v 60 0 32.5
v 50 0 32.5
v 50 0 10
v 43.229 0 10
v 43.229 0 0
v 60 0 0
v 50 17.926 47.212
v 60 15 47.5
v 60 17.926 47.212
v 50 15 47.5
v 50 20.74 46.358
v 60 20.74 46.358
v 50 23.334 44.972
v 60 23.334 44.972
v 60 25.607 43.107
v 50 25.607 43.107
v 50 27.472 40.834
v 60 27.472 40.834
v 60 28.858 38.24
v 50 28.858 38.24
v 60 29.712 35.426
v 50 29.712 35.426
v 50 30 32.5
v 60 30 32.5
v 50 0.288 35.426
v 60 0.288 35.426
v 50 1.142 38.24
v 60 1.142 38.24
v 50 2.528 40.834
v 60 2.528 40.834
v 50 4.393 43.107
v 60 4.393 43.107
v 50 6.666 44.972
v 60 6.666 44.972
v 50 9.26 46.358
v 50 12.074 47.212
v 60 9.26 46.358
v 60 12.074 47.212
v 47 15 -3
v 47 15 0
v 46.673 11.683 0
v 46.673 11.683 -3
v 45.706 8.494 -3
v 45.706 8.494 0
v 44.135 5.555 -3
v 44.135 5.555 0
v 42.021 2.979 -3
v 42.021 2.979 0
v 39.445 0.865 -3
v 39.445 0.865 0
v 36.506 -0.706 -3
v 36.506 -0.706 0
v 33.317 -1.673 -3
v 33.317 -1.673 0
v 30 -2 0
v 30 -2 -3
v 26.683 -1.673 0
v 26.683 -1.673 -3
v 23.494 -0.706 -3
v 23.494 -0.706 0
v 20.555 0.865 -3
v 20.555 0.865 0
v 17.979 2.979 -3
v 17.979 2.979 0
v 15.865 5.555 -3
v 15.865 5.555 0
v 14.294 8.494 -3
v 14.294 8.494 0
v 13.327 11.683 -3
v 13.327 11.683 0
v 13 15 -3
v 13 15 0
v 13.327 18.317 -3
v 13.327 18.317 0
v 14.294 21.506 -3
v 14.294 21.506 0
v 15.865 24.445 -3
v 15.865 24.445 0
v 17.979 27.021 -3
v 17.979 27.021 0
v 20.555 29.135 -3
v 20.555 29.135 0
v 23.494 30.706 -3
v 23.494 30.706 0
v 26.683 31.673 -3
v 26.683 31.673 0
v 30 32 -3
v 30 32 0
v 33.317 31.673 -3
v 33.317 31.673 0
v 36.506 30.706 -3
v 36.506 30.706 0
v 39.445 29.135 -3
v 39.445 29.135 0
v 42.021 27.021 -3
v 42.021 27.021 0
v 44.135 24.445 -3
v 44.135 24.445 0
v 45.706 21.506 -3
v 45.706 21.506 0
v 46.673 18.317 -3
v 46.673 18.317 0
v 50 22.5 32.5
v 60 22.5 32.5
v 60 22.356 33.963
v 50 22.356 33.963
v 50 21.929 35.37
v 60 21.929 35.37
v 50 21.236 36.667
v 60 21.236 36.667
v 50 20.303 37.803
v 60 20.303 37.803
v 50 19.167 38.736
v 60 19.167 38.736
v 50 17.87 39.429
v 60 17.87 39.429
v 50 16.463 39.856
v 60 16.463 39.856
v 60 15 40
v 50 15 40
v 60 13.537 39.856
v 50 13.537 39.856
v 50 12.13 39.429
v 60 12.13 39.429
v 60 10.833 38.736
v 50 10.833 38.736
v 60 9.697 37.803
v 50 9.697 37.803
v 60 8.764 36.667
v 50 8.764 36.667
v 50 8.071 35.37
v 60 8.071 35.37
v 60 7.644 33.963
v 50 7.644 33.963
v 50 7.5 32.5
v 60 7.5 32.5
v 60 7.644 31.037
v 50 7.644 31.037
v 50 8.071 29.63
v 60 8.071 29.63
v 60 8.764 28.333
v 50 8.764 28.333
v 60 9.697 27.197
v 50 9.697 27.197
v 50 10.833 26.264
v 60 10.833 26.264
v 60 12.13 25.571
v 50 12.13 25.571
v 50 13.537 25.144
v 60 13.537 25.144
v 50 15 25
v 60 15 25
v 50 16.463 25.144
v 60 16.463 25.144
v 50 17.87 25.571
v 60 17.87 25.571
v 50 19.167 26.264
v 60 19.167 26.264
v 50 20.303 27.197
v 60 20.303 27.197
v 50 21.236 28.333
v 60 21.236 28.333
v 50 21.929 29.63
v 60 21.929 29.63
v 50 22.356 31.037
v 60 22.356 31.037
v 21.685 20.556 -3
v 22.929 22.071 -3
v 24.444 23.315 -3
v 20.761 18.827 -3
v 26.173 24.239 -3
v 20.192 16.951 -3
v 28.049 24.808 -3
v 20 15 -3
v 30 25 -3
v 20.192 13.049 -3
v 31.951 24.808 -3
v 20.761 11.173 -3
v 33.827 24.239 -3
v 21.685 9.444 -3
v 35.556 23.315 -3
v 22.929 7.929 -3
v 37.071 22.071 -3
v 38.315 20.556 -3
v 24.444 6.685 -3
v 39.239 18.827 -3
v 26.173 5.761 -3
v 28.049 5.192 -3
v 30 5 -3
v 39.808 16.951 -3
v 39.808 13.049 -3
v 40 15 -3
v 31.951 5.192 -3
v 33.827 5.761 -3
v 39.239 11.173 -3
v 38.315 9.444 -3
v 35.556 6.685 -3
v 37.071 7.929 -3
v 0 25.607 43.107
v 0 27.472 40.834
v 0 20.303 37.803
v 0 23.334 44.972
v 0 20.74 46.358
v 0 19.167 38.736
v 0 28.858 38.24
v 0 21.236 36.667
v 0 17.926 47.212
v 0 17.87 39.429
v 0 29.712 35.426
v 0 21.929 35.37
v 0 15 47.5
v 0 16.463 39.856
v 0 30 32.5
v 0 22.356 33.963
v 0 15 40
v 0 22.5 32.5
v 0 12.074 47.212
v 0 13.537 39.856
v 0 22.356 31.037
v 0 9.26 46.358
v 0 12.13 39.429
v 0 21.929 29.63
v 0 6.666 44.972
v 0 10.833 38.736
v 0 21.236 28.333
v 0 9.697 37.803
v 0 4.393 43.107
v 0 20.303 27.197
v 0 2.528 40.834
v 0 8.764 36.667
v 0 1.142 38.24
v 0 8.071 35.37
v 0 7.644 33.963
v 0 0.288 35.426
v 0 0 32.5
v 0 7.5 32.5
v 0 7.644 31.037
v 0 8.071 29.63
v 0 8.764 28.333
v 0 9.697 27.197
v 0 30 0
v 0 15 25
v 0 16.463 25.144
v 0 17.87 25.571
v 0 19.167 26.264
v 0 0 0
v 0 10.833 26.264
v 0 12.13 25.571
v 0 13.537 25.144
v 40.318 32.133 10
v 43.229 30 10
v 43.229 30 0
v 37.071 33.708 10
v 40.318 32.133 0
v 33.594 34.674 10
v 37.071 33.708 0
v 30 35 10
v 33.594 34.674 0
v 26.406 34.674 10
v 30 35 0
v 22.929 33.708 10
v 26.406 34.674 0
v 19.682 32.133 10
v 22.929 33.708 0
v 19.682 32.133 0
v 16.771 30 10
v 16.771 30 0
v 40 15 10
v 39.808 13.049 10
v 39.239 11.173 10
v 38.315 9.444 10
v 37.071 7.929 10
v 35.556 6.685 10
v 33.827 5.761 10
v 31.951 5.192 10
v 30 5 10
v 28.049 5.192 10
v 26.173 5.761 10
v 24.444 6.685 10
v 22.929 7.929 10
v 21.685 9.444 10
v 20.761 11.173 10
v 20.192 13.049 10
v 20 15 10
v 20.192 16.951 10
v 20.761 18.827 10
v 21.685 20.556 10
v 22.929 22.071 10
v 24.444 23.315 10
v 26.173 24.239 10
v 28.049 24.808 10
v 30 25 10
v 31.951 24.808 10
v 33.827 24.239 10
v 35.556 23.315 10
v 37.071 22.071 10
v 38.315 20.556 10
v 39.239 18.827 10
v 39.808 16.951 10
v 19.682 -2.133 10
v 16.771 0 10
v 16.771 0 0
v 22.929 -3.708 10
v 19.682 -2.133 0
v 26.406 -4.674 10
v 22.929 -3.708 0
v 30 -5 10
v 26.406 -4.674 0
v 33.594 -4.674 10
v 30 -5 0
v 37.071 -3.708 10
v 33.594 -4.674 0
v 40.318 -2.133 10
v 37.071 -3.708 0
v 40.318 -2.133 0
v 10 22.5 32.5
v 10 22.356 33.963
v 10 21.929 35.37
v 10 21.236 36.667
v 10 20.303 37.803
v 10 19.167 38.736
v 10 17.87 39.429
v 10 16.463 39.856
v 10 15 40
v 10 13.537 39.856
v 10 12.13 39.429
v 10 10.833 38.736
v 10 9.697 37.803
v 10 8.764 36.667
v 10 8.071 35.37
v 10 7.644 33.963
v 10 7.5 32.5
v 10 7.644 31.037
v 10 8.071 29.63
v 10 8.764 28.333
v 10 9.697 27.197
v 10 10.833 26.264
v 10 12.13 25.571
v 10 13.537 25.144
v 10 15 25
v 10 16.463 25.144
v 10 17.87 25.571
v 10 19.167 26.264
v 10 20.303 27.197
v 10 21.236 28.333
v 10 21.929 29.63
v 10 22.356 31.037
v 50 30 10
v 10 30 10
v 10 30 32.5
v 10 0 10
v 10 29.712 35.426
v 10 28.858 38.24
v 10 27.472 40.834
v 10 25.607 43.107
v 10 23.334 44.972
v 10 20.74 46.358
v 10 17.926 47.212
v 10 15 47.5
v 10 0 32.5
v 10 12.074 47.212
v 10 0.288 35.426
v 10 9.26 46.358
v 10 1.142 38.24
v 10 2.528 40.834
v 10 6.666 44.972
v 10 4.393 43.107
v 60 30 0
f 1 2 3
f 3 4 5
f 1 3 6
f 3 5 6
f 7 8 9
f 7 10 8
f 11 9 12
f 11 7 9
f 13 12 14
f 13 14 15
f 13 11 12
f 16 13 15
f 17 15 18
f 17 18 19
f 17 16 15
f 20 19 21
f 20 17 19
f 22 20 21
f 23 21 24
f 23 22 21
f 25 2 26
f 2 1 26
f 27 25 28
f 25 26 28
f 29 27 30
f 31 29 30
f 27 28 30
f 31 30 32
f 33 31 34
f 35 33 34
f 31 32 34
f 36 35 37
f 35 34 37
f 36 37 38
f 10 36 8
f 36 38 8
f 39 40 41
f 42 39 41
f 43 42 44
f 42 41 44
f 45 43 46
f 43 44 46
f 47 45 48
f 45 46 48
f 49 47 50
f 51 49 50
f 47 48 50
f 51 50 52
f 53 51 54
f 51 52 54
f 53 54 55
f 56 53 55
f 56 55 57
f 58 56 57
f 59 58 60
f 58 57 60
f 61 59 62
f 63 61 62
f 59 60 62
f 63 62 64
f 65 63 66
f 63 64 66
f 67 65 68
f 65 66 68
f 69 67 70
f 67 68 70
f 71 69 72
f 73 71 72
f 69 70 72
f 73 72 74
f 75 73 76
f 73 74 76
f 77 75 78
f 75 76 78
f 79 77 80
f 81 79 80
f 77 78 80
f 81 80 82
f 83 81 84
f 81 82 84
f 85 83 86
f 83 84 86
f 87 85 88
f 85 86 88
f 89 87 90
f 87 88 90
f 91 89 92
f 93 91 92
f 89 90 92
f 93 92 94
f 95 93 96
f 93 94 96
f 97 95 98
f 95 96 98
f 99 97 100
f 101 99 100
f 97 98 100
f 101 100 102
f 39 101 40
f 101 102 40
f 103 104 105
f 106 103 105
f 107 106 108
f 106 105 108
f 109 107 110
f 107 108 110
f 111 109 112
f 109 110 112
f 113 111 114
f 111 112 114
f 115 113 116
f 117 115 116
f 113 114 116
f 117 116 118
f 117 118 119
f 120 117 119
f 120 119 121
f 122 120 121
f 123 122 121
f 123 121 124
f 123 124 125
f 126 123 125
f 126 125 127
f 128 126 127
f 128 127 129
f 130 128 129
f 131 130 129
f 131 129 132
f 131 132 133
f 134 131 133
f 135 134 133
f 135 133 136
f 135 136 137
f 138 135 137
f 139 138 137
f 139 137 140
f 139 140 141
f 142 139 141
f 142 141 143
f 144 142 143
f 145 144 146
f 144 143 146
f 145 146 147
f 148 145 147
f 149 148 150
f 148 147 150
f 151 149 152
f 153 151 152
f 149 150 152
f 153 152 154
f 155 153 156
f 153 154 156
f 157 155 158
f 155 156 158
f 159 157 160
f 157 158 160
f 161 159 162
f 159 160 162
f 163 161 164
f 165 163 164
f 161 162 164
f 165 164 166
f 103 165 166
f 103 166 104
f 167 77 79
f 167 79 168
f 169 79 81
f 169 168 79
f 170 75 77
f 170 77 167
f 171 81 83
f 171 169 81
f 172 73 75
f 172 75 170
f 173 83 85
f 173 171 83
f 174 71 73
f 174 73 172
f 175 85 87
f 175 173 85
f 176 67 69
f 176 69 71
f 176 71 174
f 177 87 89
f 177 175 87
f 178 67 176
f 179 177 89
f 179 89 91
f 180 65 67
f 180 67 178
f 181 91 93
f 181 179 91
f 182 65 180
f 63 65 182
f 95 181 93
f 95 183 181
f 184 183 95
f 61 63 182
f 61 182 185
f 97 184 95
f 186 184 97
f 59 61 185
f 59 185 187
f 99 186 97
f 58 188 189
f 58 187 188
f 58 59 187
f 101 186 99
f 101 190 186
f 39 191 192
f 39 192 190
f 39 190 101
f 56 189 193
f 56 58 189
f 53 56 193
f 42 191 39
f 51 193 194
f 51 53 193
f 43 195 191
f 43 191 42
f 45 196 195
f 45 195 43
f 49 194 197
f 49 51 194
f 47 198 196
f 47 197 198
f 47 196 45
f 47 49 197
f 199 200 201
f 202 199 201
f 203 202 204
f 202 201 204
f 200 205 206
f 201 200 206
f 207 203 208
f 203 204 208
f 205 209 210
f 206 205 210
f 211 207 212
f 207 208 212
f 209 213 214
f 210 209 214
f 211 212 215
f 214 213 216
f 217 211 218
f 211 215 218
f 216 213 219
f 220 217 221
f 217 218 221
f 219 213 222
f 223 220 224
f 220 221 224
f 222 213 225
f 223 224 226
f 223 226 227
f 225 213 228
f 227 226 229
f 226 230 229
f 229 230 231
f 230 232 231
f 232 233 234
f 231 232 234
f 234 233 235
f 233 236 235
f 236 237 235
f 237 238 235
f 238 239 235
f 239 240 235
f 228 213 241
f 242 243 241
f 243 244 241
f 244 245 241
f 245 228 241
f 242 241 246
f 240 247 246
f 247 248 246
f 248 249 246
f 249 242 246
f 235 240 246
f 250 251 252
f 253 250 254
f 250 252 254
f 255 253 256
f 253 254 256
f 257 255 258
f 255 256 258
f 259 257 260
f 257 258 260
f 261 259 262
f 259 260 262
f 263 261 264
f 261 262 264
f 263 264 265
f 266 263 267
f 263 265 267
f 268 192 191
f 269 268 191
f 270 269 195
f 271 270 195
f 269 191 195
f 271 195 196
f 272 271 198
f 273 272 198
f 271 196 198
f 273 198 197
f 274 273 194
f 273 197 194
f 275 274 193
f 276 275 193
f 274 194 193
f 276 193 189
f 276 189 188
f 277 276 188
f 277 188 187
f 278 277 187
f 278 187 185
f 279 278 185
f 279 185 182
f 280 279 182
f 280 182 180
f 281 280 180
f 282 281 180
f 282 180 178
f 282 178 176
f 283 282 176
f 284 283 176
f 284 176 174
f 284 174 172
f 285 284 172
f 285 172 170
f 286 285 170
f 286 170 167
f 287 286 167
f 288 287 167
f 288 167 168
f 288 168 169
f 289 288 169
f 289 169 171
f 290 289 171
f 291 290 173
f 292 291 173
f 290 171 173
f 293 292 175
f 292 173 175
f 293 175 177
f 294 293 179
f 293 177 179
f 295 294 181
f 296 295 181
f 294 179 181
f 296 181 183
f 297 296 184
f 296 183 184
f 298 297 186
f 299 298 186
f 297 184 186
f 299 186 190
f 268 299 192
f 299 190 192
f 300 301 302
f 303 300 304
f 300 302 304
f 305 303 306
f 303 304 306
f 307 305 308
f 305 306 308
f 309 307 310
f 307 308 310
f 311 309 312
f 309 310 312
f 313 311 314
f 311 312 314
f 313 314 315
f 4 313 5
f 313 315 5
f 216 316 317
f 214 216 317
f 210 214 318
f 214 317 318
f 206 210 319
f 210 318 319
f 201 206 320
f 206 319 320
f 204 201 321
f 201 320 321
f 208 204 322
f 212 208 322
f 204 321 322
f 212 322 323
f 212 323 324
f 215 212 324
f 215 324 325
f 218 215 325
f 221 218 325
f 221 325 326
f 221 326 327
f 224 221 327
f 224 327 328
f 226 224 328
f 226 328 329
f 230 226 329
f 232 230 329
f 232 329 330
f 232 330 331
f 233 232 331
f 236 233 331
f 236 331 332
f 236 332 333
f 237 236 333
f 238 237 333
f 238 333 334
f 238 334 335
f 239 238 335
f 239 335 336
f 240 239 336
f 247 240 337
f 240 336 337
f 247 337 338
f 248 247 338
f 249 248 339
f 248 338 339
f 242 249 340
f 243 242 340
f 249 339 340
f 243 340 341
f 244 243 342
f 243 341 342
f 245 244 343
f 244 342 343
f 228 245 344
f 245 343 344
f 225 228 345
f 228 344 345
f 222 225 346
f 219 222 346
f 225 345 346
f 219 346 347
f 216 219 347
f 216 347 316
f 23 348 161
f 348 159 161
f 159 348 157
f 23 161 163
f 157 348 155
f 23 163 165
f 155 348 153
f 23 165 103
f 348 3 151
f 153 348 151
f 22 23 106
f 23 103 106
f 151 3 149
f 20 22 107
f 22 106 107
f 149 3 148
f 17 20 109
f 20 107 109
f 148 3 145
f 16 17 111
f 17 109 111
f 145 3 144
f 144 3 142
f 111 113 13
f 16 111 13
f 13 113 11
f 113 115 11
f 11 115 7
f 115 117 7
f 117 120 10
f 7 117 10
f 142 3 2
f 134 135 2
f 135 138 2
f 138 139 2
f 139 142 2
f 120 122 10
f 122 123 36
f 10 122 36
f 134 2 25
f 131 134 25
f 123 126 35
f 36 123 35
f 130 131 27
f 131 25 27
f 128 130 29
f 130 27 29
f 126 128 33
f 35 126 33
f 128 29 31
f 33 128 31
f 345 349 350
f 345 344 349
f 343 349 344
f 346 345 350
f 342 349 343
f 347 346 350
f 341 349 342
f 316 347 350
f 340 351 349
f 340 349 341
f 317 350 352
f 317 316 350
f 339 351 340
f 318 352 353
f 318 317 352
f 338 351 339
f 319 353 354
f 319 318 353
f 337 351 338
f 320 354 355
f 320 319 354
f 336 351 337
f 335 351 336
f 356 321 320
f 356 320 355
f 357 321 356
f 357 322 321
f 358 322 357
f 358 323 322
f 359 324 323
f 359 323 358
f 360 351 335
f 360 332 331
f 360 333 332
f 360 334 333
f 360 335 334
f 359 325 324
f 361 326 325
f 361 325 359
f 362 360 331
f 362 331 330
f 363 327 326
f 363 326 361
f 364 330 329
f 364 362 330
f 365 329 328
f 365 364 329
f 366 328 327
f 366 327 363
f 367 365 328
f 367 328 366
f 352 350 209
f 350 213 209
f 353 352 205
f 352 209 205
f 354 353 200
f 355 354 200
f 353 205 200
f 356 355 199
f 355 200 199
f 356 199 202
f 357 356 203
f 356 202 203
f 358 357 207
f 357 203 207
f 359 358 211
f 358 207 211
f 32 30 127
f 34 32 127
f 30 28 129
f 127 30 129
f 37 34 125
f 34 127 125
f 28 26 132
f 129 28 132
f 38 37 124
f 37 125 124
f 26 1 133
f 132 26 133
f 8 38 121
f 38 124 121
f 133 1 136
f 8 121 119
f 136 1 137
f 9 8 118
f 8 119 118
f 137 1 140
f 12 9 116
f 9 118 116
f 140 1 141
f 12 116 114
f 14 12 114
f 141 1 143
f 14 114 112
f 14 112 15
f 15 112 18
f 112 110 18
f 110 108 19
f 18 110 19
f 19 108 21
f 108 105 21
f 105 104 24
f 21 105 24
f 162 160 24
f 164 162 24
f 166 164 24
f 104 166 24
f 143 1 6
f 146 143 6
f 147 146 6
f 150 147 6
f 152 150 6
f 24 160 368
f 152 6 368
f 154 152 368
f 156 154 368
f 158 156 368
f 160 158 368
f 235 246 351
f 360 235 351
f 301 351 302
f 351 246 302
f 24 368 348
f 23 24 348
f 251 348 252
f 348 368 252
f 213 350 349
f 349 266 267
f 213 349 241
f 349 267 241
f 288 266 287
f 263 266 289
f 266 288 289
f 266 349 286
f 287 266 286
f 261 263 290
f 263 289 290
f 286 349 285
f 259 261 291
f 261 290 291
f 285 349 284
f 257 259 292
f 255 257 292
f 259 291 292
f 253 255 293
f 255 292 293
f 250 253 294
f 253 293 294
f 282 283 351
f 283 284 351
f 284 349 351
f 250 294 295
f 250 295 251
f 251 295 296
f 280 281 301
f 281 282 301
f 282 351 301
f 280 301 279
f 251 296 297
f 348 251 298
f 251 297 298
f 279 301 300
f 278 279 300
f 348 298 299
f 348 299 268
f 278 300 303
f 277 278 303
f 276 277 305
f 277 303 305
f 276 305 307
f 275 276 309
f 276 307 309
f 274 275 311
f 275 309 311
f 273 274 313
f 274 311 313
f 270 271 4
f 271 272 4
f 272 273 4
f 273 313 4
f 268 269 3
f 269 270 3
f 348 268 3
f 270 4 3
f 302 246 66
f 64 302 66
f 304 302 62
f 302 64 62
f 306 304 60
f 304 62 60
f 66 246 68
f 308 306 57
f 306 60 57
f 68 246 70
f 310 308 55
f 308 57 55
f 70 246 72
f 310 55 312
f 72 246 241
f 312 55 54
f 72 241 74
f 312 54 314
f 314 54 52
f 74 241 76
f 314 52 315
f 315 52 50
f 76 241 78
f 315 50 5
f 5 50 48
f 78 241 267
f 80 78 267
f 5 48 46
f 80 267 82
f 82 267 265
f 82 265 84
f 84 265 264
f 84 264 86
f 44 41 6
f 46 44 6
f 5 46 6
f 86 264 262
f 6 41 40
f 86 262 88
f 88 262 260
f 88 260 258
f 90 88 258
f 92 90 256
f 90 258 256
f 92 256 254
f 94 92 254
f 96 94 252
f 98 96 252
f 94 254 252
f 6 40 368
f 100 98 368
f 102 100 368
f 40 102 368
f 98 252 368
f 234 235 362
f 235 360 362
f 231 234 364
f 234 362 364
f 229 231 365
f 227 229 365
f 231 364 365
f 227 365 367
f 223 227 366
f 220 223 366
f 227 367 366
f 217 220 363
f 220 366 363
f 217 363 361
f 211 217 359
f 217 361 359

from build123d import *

# Parameters (mm, degrees)
F1_DEPTH  = 47.5
F2_W      = 40
F2_H      = 37.5
F3_DEPTH  = 205
F4_W      = 26.4575131106
F4_H      = 37.5
F5_DEPTH  = 25
F6_R      = 17
F7_DEPTH  = 3
F8_R      = 10
F9_DEPTH  = 25
F11_DEPTH = 125
F12_R     = 14.99999


# Not quite as in the source:
# - a fillet or chamfer is up to 0.001 mm smaller than in the source, because OpenCascade refuses the exact size


with BuildPart() as f1:
    # F0 (on Top) → F1 (new body)
    with BuildSketch(Plane.XY):
        Polygon((0, 15), (0, 0), (16.7712434447, 0), (43.2287565553, 0), (60, 0), (60, 15), (60, 30), (43.2287565553, 30), (16.7712434447, 30), (0, 30), align=None)
        with BuildLine():
            Line((49.2664991614, 20.3667504193), (60, 15))
            Line((60, 15), (50, 15))
            ThreePointArc((50, 15), (49.8157763314, 17.7083220609), (49.2664991614, 20.3667504193))
        make_face(mode=Mode.SUBTRACT)
        with BuildLine():
            Line((43.2287565553, 0), (16.7712434447, 0))
            ThreePointArc((16.7712434447, 0), (30, -5), (43.2287565553, 0))
        make_face()
        with BuildLine():
            ThreePointArc((43.2287565553, 30), (30, 35), (16.7712434447, 30))
            Line((16.7712434447, 30), (43.2287565553, 30))
        make_face()
        with BuildLine():
            Line((50, 15), (60, 15))
            Line((60, 15), (49.2664991614, 20.3667504193))
            ThreePointArc((49.2664991614, 20.3667504193), (49.8157763314, 17.7083220609), (50, 15))
        make_face()
    extrude(amount=F1_DEPTH)

    # F2 (on face) → F3 (cut)
    with BuildSketch(Plane.XZ):
        with Locations((30, 28.75)):
            Rectangle(F2_W, F2_H)
    extrude(amount=-F3_DEPTH, mode=Mode.SUBTRACT)

    # F4 (on face) → F5 (cut)
    with BuildSketch(Plane(origin=(0, 0, 0), x_dir=(-1, 0, 0), z_dir=(0, 1, 0))):
        with Locations((-30, 28.75)):
            Rectangle(F4_W, F4_H)
    extrude(amount=-F5_DEPTH, mode=Mode.SUBTRACT)

    # F6 (on face) → F7 (join)
    with BuildSketch(Plane(origin=(0, 0, 0), x_dir=(1, 0, 0), z_dir=(0, 0, -1))):
        with Locations((30, -15)):
            Circle(F6_R)
    extrude(amount=F7_DEPTH)

    # F8 (on face) → F9 (cut)
    with BuildSketch(Plane(origin=(0, 0, -3), x_dir=(1, 0, 0), z_dir=(0, 0, -1))):
        with Locations((30, -15)):
            Circle(F8_R)
    extrude(amount=-F9_DEPTH, mode=Mode.SUBTRACT)

    # F10 (on face) → F11 (cut)
    with BuildSketch(Plane.YZ.offset(60)):
        with BuildLine():
            ThreePointArc((15, 25), (20.3033008589, 27.1966991411), (22.5, 32.5))
            ThreePointArc((22.5, 32.5), (9.6966991411, 37.8033008589), (15, 25))
        make_face()
    extrude(amount=-F11_DEPTH, mode=Mode.SUBTRACT)

    # F12 (radius 15 in the source; OpenCascade refuses exactly that, so slightly less here)
    f12_edges = [f1.edges().sort_by_distance(p)[0] for p in [
        (55, 0, 47.5),
        (55, 30, 47.5),
        (5, 0, 47.5),
        (5, 30, 47.5),
    ]]
    fillet(f12_edges, radius=F12_R)


solid = f1.part
